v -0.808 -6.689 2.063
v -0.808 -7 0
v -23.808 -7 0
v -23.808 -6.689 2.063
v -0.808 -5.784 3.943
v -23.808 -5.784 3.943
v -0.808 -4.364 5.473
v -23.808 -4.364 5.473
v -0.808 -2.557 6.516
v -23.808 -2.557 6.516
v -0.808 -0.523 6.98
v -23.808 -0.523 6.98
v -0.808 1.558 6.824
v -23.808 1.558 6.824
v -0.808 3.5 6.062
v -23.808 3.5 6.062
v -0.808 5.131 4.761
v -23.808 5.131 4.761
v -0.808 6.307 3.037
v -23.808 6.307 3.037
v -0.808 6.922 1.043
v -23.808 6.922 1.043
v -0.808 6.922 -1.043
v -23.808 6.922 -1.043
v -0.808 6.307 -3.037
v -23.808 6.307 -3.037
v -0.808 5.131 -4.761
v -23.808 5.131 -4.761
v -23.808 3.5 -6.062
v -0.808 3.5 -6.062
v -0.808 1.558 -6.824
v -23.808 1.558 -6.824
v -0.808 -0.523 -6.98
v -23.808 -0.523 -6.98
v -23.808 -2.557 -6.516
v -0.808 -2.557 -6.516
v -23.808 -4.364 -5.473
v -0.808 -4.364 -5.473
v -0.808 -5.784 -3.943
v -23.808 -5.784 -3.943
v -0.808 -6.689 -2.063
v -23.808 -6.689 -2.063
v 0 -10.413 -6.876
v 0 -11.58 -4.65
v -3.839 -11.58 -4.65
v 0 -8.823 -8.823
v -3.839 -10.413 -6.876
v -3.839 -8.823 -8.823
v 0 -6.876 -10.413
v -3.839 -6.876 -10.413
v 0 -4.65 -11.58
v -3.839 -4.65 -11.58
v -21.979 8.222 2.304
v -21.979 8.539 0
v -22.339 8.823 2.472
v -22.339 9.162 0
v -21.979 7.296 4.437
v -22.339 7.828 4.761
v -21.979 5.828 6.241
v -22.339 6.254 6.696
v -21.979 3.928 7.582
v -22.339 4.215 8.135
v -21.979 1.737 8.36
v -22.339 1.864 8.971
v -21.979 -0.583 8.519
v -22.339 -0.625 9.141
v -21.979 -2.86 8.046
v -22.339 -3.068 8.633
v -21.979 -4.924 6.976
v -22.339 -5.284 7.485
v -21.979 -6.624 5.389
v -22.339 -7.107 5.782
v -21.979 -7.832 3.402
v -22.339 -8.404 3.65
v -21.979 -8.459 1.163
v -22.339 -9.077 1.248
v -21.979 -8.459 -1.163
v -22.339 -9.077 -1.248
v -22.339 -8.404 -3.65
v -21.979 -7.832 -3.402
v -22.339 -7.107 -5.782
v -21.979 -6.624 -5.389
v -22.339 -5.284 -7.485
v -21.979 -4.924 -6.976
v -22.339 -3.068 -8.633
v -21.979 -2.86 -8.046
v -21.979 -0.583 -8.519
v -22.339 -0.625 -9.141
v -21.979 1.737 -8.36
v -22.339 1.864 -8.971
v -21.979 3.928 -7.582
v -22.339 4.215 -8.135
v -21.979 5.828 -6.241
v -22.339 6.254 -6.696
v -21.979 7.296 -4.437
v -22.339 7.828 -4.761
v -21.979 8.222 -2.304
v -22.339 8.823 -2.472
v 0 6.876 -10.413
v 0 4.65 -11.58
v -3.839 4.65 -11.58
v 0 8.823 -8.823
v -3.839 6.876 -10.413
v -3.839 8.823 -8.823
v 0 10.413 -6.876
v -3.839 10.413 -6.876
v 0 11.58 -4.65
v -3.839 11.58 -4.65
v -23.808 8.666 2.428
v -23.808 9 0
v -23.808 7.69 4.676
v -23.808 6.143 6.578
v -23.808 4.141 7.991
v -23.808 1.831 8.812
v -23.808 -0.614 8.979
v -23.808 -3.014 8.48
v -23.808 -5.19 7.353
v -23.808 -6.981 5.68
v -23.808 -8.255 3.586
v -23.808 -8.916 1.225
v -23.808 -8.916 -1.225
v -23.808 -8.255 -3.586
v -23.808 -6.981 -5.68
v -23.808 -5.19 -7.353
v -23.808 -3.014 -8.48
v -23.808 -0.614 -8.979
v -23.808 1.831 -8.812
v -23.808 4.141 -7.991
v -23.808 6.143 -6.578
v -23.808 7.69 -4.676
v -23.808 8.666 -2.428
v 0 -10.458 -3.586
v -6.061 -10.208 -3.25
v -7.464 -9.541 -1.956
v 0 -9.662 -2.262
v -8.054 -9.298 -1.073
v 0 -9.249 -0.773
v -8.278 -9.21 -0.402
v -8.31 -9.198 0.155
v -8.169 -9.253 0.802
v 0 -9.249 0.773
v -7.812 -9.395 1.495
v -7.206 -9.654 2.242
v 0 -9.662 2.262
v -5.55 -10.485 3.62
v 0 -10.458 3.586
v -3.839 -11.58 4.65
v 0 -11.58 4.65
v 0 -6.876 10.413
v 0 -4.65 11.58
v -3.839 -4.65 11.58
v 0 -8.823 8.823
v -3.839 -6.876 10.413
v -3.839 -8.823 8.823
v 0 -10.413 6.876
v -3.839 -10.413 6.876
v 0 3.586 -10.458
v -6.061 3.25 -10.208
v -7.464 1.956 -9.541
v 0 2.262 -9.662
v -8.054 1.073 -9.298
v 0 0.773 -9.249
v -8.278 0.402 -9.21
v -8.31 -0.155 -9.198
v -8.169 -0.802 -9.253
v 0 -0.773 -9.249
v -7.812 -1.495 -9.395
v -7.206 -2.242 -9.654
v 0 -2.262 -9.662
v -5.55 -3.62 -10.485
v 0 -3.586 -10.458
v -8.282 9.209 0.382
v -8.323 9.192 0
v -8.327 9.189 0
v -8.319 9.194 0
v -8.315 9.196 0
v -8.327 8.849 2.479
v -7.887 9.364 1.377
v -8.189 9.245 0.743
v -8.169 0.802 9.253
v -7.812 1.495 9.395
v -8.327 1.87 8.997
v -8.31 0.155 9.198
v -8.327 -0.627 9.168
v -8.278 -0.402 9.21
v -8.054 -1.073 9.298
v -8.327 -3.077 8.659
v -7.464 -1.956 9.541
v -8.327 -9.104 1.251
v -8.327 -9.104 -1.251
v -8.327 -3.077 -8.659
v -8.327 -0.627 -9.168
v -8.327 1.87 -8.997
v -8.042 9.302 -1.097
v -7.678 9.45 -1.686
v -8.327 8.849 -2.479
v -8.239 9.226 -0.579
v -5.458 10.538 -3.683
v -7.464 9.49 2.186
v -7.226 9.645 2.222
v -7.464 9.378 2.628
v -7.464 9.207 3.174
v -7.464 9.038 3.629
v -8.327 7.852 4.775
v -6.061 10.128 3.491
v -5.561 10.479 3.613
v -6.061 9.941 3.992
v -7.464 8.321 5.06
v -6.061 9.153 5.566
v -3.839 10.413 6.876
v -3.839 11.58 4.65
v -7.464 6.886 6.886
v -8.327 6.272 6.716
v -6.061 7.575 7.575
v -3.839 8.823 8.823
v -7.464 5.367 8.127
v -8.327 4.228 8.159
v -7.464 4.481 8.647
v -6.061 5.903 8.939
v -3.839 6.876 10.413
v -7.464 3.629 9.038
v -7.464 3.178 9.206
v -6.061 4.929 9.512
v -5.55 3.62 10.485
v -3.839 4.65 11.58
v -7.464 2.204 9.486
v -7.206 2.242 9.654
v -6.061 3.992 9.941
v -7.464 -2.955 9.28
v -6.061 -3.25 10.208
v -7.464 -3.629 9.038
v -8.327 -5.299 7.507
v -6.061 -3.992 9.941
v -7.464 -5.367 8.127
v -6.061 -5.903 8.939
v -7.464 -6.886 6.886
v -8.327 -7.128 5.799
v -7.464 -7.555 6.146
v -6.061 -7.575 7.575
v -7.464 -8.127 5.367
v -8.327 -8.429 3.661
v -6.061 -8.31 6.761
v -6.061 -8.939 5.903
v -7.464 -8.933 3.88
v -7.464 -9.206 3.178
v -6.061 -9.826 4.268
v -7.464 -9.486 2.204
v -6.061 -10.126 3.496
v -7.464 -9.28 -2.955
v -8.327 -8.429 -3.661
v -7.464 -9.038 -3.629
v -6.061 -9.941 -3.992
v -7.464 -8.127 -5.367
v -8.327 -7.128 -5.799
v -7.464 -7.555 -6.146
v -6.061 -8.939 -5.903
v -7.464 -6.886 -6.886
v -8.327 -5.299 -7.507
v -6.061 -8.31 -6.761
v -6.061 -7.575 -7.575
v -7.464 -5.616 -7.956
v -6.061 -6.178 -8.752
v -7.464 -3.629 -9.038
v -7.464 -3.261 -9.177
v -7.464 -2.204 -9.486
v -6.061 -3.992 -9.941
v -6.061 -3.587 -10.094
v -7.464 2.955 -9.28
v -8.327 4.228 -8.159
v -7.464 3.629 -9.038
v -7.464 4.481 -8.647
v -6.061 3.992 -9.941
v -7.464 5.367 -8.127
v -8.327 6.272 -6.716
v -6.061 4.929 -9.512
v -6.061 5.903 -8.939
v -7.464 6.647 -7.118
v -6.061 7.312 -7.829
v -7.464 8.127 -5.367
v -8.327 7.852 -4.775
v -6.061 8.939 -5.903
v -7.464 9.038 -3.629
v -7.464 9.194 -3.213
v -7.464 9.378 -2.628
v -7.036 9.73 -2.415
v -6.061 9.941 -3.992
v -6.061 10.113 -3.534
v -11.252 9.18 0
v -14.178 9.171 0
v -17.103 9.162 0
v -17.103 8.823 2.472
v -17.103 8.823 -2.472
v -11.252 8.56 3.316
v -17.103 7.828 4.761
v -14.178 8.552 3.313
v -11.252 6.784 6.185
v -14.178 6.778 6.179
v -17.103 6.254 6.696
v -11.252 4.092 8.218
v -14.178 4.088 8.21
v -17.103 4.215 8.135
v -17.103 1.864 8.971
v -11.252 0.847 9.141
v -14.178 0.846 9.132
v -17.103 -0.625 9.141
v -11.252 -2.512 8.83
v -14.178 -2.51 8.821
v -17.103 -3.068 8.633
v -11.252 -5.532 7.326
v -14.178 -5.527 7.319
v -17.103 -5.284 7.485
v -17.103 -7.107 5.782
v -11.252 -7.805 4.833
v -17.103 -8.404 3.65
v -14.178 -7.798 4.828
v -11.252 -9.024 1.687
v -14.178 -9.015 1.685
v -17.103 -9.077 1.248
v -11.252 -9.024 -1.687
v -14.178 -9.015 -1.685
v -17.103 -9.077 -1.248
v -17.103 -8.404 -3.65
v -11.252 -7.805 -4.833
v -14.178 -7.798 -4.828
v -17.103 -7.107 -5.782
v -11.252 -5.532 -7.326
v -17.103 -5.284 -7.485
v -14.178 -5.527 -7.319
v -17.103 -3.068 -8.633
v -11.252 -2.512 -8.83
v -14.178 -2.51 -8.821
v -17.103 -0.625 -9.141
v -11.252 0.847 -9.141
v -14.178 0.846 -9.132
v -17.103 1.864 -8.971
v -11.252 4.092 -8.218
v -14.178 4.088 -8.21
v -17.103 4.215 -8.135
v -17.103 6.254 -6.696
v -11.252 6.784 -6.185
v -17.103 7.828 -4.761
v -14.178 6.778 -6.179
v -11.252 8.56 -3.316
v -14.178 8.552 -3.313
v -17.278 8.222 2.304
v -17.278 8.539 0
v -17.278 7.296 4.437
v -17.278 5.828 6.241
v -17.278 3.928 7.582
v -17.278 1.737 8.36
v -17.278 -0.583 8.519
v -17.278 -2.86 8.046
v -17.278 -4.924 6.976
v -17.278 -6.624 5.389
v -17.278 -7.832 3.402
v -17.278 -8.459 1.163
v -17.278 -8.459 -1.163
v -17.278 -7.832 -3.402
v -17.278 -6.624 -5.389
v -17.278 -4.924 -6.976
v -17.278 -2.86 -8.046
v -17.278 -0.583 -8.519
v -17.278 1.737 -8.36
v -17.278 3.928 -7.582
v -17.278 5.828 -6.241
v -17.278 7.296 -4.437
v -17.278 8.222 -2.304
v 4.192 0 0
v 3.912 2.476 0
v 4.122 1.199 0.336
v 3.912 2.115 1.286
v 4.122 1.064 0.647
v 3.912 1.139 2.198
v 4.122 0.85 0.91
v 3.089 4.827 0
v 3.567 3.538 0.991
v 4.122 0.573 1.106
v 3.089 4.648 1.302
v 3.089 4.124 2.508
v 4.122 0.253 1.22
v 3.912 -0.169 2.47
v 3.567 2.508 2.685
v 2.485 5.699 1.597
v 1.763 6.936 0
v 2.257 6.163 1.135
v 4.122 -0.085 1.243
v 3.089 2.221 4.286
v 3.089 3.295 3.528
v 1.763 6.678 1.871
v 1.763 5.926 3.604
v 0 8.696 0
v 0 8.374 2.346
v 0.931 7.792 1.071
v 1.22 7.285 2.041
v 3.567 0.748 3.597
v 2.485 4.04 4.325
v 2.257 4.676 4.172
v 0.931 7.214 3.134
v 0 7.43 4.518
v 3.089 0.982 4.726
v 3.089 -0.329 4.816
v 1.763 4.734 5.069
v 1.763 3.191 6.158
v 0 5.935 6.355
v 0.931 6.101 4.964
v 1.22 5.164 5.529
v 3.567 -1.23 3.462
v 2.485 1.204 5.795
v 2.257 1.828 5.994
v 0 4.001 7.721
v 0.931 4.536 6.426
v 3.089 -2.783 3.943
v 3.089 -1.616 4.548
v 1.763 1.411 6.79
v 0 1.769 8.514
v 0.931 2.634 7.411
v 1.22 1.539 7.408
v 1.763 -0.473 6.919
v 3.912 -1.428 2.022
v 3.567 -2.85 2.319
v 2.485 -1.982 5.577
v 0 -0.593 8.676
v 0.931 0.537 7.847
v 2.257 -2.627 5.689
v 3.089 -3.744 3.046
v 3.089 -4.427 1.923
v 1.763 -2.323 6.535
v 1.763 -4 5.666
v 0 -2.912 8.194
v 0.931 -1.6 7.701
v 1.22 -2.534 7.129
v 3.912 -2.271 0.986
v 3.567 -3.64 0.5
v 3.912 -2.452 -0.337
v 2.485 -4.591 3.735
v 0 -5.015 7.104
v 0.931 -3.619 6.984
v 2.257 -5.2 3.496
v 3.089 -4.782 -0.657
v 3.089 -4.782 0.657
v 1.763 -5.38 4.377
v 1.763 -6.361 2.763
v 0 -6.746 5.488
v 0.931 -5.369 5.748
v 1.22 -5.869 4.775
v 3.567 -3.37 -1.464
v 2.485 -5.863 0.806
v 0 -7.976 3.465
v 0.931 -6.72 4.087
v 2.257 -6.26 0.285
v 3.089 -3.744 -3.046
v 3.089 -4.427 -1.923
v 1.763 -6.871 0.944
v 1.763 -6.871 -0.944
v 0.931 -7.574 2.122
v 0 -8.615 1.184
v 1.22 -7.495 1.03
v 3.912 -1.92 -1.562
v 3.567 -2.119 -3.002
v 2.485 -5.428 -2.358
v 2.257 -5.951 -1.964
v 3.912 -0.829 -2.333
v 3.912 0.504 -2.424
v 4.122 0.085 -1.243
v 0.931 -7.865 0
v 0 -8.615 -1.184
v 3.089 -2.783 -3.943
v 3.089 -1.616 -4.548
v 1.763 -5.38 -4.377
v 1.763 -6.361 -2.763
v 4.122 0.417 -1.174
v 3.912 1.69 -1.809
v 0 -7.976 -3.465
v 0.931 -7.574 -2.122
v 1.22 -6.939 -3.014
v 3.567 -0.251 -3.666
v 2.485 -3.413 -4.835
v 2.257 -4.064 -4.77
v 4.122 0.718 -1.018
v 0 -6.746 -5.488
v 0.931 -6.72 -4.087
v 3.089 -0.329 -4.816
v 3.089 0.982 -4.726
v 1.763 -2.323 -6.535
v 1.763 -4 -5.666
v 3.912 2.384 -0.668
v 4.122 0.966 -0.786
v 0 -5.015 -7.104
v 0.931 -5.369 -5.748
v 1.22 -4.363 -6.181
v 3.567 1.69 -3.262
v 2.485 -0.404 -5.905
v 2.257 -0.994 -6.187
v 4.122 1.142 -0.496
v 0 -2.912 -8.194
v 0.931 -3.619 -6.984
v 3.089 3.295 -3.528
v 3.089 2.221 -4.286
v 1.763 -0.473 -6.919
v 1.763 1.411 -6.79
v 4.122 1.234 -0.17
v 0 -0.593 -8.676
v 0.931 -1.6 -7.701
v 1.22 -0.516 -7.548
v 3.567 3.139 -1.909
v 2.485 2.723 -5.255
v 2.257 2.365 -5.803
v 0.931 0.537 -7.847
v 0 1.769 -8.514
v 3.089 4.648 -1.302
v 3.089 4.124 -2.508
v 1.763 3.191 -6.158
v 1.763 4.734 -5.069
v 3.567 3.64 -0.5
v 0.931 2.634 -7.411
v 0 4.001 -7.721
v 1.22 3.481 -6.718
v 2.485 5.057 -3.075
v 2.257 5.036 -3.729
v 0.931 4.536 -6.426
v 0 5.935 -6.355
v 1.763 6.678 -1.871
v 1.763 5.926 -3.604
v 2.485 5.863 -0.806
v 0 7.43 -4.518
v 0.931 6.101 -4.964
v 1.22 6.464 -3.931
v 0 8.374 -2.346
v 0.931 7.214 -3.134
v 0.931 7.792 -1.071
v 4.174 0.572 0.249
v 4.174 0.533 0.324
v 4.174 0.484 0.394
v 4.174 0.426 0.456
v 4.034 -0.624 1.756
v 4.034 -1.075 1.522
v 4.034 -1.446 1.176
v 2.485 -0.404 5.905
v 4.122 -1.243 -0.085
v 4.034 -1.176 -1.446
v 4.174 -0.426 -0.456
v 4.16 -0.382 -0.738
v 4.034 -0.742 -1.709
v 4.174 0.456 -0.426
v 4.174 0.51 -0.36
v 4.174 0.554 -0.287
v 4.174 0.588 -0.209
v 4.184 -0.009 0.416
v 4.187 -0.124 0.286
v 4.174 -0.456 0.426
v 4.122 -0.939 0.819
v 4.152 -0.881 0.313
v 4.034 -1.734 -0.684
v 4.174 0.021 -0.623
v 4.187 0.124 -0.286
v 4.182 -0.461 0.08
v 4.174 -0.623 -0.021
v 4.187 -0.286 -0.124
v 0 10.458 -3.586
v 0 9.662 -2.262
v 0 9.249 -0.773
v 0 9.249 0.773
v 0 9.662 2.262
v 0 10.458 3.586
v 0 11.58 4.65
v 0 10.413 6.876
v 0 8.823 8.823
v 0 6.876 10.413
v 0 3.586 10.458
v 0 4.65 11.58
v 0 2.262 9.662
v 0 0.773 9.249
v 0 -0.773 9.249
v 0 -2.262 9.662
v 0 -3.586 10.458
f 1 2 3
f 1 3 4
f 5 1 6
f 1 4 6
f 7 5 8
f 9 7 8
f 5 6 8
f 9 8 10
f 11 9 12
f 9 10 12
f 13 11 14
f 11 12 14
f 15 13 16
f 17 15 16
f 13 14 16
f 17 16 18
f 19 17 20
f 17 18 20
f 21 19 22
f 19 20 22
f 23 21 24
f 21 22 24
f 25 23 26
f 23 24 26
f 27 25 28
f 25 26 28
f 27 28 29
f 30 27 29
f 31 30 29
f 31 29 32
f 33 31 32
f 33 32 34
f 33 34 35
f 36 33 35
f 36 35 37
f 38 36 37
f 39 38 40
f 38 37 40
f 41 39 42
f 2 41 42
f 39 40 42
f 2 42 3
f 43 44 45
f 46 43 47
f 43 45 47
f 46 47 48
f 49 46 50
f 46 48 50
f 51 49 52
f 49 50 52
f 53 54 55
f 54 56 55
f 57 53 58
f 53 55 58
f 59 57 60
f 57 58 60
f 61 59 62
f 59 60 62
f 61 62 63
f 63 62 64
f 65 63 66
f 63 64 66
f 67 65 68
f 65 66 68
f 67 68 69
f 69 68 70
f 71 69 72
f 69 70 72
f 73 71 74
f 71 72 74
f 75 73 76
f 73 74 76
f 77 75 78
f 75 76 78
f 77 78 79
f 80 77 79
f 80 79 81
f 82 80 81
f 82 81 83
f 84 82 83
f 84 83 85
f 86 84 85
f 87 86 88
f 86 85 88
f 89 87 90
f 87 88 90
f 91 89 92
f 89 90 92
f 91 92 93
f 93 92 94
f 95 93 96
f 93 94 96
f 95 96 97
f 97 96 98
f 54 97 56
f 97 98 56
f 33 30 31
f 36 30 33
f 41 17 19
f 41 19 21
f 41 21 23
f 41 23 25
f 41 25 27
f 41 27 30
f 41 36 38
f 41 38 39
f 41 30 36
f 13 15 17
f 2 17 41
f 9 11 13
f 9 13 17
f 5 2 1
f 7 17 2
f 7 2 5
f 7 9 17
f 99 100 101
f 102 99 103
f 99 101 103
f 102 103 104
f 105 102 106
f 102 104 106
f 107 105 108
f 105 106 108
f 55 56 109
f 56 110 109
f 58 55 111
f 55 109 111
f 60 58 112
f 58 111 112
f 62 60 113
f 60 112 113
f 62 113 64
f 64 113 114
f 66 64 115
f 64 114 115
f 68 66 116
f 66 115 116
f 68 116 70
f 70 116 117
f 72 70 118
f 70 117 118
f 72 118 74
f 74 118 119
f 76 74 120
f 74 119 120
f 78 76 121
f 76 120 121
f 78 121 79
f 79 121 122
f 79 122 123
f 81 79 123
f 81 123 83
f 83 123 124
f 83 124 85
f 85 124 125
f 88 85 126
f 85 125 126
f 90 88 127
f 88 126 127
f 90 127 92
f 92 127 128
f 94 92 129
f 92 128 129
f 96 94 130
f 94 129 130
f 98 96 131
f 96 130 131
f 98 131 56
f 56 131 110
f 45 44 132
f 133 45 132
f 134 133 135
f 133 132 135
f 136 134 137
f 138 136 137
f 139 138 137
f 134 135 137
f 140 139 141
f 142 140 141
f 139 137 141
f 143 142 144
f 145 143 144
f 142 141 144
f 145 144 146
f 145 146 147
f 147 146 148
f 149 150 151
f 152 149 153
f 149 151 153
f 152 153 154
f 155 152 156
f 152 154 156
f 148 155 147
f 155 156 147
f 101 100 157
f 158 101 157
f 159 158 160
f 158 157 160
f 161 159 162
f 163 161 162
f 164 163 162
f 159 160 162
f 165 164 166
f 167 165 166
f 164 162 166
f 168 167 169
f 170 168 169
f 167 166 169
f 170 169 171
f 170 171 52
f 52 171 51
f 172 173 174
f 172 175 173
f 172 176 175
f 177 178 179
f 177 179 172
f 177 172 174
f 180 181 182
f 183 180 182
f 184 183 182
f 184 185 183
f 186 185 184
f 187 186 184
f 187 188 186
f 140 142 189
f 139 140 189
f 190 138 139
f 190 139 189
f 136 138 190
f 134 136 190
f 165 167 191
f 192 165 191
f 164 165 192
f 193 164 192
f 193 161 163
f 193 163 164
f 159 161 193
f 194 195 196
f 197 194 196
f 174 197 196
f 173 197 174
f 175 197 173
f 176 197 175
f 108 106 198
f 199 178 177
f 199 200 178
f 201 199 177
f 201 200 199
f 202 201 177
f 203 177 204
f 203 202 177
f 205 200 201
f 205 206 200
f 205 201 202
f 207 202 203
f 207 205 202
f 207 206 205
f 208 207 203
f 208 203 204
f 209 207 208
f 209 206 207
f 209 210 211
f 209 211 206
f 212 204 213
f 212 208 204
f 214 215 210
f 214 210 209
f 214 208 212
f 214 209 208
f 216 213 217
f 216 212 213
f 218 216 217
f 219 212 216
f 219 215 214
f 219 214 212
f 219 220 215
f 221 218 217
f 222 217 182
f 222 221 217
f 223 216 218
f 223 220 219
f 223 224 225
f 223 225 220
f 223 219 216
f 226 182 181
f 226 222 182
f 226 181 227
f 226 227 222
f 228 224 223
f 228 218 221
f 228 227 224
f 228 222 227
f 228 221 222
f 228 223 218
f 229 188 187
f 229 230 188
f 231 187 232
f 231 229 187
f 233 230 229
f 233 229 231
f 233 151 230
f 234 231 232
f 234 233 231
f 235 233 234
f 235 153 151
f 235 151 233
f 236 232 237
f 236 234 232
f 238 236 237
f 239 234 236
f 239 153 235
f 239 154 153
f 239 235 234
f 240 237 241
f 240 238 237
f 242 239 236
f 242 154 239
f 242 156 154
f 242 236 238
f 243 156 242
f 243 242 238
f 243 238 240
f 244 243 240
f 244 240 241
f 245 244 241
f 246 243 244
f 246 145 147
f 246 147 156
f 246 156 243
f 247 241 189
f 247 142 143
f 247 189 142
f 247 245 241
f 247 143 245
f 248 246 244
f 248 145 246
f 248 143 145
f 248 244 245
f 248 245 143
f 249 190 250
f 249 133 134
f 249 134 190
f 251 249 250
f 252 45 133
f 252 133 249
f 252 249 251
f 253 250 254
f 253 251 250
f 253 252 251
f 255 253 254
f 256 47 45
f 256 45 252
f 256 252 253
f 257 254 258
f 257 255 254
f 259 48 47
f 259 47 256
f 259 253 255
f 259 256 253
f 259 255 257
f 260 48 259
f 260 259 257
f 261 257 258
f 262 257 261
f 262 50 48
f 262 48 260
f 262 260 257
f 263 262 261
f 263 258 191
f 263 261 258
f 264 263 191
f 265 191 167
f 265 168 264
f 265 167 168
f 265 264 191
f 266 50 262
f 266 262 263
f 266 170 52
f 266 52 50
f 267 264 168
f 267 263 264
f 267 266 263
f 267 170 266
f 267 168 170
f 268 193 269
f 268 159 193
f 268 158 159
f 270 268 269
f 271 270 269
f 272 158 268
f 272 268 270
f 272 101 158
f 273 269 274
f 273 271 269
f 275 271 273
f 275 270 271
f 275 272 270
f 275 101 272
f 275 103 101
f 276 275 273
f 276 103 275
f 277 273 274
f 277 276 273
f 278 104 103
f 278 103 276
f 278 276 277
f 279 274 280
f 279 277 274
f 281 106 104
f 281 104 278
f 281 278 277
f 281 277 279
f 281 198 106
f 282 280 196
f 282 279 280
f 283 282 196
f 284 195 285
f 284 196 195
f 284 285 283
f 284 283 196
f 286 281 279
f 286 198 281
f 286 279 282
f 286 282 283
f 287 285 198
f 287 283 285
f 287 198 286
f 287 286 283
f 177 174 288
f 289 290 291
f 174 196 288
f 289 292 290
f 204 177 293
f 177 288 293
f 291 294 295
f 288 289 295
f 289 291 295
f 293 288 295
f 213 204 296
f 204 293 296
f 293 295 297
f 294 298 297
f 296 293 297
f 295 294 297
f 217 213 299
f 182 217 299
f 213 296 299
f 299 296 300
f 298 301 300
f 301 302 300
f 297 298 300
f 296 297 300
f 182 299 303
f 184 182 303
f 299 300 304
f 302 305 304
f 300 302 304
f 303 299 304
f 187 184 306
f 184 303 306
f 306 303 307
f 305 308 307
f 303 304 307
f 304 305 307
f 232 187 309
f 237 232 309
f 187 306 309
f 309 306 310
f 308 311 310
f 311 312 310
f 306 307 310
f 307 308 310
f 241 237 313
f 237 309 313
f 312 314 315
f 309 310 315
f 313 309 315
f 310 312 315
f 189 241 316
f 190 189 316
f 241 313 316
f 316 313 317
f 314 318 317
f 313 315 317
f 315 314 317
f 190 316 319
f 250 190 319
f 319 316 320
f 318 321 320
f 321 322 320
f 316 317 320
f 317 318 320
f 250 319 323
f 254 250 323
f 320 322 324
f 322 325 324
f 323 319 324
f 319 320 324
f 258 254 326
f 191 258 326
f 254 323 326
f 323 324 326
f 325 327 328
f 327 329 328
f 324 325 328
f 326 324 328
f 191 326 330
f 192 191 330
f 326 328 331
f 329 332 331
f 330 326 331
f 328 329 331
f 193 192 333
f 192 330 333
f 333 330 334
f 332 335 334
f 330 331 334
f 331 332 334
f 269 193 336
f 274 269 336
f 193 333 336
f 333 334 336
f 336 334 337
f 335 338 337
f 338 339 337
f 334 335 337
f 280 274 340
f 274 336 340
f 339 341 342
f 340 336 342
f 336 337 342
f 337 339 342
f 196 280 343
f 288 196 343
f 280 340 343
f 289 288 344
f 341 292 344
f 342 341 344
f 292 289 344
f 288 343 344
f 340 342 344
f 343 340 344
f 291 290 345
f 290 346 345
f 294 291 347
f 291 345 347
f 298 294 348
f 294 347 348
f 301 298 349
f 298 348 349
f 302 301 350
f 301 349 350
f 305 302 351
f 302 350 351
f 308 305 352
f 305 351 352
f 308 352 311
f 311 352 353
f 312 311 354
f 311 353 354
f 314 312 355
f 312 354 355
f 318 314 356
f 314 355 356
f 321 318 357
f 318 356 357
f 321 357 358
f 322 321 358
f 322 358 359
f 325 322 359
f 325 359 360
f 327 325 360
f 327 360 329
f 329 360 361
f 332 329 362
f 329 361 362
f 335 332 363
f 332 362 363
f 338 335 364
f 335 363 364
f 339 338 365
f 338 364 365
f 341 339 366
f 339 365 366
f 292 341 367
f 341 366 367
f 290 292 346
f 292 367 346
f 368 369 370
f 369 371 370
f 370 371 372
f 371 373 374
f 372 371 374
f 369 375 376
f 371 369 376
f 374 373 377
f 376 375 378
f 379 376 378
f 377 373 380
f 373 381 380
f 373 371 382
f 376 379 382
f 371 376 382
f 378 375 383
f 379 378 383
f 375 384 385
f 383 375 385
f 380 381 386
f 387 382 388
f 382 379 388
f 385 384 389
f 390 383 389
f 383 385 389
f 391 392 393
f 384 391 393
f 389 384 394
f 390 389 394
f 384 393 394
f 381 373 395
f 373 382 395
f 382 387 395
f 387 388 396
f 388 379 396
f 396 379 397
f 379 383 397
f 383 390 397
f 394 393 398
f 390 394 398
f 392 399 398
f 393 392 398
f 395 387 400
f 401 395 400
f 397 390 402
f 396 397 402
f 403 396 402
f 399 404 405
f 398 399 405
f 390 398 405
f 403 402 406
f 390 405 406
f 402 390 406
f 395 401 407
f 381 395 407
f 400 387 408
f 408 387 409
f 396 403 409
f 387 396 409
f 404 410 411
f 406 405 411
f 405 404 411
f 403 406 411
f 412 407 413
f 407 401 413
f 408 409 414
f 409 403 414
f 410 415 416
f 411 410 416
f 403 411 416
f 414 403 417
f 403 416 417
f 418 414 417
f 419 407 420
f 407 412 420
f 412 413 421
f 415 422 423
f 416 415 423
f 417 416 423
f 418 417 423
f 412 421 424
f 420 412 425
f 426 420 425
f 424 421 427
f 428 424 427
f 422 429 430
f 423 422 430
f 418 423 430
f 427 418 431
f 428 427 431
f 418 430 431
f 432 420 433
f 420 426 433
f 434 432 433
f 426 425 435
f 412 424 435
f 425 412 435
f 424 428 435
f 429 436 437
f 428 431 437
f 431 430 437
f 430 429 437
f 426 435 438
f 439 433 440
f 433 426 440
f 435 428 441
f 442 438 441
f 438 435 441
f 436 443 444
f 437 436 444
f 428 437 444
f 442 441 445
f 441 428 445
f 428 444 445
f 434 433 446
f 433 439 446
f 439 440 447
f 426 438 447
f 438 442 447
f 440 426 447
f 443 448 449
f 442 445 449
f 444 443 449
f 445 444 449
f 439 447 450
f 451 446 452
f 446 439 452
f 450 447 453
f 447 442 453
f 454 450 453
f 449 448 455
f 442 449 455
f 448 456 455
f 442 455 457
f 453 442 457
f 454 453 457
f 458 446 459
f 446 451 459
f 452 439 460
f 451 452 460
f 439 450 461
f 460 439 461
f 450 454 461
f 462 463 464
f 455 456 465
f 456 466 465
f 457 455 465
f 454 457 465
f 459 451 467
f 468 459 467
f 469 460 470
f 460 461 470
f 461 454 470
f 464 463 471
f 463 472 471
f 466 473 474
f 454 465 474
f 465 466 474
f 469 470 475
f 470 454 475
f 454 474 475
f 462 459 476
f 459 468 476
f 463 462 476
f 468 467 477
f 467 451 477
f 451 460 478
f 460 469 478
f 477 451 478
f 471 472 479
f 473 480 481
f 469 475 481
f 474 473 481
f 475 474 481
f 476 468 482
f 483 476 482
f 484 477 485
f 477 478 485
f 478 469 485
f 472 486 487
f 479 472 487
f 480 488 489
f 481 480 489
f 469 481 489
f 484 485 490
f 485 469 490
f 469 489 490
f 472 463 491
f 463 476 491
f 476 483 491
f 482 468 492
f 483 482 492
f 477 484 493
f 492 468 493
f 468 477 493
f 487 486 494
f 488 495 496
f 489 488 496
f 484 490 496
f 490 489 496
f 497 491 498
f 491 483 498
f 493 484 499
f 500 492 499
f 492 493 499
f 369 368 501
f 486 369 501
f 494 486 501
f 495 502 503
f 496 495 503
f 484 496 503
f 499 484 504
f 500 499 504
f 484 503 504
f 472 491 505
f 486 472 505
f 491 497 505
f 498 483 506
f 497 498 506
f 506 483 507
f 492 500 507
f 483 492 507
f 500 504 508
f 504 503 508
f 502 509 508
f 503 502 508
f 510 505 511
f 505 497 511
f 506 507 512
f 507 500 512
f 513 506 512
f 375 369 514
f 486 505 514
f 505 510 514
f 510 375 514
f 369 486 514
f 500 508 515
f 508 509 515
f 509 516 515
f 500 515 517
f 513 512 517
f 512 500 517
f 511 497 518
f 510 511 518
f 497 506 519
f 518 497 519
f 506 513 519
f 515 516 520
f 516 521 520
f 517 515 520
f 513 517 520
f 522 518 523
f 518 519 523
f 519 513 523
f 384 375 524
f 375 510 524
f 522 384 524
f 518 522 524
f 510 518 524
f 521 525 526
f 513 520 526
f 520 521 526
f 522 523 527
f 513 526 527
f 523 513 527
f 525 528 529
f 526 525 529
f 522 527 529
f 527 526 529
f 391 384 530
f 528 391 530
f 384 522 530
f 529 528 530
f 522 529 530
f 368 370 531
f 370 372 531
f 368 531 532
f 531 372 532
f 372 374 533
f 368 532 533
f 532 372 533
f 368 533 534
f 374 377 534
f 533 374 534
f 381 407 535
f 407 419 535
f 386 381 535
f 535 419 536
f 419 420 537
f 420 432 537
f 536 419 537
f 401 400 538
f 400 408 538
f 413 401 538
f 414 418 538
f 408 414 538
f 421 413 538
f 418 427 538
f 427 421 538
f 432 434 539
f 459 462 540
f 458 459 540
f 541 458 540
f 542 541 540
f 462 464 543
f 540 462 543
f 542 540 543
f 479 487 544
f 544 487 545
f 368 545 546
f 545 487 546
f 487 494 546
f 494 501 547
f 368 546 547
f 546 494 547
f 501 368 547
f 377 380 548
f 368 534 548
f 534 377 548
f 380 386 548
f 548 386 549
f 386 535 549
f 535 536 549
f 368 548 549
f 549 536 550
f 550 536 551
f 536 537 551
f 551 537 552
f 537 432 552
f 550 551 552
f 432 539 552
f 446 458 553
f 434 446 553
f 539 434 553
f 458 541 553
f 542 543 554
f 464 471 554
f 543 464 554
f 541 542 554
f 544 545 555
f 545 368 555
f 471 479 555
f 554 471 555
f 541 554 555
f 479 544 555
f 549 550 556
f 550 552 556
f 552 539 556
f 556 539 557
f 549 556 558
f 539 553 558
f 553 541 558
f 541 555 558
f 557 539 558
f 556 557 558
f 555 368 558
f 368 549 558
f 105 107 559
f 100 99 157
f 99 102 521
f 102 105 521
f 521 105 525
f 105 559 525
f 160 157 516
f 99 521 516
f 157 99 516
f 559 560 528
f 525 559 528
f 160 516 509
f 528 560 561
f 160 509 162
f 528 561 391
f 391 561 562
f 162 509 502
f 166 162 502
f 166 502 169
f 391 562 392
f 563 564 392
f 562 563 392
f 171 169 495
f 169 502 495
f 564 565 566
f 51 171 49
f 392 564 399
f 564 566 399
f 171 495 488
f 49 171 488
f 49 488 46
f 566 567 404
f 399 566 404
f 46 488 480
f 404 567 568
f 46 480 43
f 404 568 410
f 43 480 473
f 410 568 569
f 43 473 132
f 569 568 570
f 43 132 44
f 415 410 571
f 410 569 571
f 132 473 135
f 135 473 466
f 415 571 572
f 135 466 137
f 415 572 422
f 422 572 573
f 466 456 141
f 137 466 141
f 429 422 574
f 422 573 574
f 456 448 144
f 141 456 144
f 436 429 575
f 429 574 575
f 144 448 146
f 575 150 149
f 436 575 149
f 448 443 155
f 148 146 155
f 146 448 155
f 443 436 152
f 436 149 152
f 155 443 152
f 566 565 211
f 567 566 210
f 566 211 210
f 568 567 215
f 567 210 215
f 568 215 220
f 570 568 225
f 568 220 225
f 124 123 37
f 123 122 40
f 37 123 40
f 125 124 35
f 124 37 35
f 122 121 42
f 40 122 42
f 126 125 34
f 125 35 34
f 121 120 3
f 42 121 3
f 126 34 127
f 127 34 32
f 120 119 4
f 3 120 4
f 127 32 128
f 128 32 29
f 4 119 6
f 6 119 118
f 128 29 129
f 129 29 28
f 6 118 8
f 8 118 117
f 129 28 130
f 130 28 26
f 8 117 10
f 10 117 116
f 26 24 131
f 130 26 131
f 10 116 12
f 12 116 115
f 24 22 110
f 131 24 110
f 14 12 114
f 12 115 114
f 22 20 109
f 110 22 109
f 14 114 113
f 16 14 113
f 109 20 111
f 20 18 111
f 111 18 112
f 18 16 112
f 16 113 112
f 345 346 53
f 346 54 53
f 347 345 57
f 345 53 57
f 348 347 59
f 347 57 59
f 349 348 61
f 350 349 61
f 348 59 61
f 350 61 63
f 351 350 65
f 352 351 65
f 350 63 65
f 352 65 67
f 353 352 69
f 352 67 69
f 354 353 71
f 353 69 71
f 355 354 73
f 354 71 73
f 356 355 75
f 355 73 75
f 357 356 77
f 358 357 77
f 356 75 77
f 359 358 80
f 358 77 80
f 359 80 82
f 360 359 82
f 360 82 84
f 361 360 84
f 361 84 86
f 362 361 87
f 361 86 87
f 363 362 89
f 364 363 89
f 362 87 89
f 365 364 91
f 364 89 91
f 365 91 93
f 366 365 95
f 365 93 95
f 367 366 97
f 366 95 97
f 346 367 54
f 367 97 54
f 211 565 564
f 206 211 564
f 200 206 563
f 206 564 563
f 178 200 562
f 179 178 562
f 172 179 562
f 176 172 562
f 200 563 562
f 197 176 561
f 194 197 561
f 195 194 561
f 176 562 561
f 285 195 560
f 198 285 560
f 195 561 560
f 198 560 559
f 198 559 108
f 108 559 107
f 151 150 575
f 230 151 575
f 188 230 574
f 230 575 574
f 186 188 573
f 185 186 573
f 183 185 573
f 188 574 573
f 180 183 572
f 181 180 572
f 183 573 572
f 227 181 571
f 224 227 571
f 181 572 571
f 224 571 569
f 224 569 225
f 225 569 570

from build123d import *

# Parameters (mm, degrees)
SKETCH001_R        = 5.72703
POCKET_DEPTH       = 113.912459
POLARPATTERN_COUNT = 4
SKETCH002_R        = 7
POCKET001_DEPTH    = 23


with BuildPart() as part:
    # Sketch → Revolution (revolve)
    with BuildSketch(Plane.XY):
        with BuildLine():
            ThreePointArc((4.191612, 0), (3.089028, 4.826759), (0, 8.696022))
            Line((0, 8.696022), (0, 12.478185))
            Line((0, 12.478185), (-3.839461, 12.478185))
            ThreePointArc((-8.326538, 9.189423), (-6.01736, 10.744248), (-3.839461, 12.478185))
            Line((-8.326538, 9.189423), (-17.102989, 9.162301))
            Line((-17.102989, 9.162301), (-17.277503, 8.538994))
            Line((-17.277503, 8.538994), (-21.978689, 8.538994))
            Line((-21.978689, 8.538994), (-22.338589, 9.1623))
            Line((-22.338589, 9.1623), (-23.808388, 9))
            Line((-23.808388, 9), (-23.808388, 0))
            Line((-23.808388, 0), (4.191612, 0))
        make_face()
    revolve(axis=Axis((0, 0, 0), (1, 0, 0)))

    # Sketch001 (on Face2 of Revolution) → Pocket (cut, through all)
    with BuildSketch(Plane.YZ):
        with Locations((14.923323, 0)):
            Circle(SKETCH001_R)
    pocket = extrude(amount=-POCKET_DEPTH, mode=Mode.SUBTRACT)

    # PolarPattern: Pocket ×4 about axis
    polarpattern_axis = Axis((0, 0, 0), (1, 0, 0))
    for i in range(1, POLARPATTERN_COUNT):
        add(pocket.rotate(polarpattern_axis, i * 360 / POLARPATTERN_COUNT), mode=Mode.SUBTRACT)

    # Sketch002 (on Face17 of PolarPattern) → Pocket001 (cut)
    with BuildSketch(Plane(origin=(-23.808388, 0, 0), x_dir=(0, -1, 0), z_dir=(-1, 0, 0))):
        Circle(SKETCH002_R)
    extrude(amount=-POCKET001_DEPTH, mode=Mode.SUBTRACT)


solid = part.part
